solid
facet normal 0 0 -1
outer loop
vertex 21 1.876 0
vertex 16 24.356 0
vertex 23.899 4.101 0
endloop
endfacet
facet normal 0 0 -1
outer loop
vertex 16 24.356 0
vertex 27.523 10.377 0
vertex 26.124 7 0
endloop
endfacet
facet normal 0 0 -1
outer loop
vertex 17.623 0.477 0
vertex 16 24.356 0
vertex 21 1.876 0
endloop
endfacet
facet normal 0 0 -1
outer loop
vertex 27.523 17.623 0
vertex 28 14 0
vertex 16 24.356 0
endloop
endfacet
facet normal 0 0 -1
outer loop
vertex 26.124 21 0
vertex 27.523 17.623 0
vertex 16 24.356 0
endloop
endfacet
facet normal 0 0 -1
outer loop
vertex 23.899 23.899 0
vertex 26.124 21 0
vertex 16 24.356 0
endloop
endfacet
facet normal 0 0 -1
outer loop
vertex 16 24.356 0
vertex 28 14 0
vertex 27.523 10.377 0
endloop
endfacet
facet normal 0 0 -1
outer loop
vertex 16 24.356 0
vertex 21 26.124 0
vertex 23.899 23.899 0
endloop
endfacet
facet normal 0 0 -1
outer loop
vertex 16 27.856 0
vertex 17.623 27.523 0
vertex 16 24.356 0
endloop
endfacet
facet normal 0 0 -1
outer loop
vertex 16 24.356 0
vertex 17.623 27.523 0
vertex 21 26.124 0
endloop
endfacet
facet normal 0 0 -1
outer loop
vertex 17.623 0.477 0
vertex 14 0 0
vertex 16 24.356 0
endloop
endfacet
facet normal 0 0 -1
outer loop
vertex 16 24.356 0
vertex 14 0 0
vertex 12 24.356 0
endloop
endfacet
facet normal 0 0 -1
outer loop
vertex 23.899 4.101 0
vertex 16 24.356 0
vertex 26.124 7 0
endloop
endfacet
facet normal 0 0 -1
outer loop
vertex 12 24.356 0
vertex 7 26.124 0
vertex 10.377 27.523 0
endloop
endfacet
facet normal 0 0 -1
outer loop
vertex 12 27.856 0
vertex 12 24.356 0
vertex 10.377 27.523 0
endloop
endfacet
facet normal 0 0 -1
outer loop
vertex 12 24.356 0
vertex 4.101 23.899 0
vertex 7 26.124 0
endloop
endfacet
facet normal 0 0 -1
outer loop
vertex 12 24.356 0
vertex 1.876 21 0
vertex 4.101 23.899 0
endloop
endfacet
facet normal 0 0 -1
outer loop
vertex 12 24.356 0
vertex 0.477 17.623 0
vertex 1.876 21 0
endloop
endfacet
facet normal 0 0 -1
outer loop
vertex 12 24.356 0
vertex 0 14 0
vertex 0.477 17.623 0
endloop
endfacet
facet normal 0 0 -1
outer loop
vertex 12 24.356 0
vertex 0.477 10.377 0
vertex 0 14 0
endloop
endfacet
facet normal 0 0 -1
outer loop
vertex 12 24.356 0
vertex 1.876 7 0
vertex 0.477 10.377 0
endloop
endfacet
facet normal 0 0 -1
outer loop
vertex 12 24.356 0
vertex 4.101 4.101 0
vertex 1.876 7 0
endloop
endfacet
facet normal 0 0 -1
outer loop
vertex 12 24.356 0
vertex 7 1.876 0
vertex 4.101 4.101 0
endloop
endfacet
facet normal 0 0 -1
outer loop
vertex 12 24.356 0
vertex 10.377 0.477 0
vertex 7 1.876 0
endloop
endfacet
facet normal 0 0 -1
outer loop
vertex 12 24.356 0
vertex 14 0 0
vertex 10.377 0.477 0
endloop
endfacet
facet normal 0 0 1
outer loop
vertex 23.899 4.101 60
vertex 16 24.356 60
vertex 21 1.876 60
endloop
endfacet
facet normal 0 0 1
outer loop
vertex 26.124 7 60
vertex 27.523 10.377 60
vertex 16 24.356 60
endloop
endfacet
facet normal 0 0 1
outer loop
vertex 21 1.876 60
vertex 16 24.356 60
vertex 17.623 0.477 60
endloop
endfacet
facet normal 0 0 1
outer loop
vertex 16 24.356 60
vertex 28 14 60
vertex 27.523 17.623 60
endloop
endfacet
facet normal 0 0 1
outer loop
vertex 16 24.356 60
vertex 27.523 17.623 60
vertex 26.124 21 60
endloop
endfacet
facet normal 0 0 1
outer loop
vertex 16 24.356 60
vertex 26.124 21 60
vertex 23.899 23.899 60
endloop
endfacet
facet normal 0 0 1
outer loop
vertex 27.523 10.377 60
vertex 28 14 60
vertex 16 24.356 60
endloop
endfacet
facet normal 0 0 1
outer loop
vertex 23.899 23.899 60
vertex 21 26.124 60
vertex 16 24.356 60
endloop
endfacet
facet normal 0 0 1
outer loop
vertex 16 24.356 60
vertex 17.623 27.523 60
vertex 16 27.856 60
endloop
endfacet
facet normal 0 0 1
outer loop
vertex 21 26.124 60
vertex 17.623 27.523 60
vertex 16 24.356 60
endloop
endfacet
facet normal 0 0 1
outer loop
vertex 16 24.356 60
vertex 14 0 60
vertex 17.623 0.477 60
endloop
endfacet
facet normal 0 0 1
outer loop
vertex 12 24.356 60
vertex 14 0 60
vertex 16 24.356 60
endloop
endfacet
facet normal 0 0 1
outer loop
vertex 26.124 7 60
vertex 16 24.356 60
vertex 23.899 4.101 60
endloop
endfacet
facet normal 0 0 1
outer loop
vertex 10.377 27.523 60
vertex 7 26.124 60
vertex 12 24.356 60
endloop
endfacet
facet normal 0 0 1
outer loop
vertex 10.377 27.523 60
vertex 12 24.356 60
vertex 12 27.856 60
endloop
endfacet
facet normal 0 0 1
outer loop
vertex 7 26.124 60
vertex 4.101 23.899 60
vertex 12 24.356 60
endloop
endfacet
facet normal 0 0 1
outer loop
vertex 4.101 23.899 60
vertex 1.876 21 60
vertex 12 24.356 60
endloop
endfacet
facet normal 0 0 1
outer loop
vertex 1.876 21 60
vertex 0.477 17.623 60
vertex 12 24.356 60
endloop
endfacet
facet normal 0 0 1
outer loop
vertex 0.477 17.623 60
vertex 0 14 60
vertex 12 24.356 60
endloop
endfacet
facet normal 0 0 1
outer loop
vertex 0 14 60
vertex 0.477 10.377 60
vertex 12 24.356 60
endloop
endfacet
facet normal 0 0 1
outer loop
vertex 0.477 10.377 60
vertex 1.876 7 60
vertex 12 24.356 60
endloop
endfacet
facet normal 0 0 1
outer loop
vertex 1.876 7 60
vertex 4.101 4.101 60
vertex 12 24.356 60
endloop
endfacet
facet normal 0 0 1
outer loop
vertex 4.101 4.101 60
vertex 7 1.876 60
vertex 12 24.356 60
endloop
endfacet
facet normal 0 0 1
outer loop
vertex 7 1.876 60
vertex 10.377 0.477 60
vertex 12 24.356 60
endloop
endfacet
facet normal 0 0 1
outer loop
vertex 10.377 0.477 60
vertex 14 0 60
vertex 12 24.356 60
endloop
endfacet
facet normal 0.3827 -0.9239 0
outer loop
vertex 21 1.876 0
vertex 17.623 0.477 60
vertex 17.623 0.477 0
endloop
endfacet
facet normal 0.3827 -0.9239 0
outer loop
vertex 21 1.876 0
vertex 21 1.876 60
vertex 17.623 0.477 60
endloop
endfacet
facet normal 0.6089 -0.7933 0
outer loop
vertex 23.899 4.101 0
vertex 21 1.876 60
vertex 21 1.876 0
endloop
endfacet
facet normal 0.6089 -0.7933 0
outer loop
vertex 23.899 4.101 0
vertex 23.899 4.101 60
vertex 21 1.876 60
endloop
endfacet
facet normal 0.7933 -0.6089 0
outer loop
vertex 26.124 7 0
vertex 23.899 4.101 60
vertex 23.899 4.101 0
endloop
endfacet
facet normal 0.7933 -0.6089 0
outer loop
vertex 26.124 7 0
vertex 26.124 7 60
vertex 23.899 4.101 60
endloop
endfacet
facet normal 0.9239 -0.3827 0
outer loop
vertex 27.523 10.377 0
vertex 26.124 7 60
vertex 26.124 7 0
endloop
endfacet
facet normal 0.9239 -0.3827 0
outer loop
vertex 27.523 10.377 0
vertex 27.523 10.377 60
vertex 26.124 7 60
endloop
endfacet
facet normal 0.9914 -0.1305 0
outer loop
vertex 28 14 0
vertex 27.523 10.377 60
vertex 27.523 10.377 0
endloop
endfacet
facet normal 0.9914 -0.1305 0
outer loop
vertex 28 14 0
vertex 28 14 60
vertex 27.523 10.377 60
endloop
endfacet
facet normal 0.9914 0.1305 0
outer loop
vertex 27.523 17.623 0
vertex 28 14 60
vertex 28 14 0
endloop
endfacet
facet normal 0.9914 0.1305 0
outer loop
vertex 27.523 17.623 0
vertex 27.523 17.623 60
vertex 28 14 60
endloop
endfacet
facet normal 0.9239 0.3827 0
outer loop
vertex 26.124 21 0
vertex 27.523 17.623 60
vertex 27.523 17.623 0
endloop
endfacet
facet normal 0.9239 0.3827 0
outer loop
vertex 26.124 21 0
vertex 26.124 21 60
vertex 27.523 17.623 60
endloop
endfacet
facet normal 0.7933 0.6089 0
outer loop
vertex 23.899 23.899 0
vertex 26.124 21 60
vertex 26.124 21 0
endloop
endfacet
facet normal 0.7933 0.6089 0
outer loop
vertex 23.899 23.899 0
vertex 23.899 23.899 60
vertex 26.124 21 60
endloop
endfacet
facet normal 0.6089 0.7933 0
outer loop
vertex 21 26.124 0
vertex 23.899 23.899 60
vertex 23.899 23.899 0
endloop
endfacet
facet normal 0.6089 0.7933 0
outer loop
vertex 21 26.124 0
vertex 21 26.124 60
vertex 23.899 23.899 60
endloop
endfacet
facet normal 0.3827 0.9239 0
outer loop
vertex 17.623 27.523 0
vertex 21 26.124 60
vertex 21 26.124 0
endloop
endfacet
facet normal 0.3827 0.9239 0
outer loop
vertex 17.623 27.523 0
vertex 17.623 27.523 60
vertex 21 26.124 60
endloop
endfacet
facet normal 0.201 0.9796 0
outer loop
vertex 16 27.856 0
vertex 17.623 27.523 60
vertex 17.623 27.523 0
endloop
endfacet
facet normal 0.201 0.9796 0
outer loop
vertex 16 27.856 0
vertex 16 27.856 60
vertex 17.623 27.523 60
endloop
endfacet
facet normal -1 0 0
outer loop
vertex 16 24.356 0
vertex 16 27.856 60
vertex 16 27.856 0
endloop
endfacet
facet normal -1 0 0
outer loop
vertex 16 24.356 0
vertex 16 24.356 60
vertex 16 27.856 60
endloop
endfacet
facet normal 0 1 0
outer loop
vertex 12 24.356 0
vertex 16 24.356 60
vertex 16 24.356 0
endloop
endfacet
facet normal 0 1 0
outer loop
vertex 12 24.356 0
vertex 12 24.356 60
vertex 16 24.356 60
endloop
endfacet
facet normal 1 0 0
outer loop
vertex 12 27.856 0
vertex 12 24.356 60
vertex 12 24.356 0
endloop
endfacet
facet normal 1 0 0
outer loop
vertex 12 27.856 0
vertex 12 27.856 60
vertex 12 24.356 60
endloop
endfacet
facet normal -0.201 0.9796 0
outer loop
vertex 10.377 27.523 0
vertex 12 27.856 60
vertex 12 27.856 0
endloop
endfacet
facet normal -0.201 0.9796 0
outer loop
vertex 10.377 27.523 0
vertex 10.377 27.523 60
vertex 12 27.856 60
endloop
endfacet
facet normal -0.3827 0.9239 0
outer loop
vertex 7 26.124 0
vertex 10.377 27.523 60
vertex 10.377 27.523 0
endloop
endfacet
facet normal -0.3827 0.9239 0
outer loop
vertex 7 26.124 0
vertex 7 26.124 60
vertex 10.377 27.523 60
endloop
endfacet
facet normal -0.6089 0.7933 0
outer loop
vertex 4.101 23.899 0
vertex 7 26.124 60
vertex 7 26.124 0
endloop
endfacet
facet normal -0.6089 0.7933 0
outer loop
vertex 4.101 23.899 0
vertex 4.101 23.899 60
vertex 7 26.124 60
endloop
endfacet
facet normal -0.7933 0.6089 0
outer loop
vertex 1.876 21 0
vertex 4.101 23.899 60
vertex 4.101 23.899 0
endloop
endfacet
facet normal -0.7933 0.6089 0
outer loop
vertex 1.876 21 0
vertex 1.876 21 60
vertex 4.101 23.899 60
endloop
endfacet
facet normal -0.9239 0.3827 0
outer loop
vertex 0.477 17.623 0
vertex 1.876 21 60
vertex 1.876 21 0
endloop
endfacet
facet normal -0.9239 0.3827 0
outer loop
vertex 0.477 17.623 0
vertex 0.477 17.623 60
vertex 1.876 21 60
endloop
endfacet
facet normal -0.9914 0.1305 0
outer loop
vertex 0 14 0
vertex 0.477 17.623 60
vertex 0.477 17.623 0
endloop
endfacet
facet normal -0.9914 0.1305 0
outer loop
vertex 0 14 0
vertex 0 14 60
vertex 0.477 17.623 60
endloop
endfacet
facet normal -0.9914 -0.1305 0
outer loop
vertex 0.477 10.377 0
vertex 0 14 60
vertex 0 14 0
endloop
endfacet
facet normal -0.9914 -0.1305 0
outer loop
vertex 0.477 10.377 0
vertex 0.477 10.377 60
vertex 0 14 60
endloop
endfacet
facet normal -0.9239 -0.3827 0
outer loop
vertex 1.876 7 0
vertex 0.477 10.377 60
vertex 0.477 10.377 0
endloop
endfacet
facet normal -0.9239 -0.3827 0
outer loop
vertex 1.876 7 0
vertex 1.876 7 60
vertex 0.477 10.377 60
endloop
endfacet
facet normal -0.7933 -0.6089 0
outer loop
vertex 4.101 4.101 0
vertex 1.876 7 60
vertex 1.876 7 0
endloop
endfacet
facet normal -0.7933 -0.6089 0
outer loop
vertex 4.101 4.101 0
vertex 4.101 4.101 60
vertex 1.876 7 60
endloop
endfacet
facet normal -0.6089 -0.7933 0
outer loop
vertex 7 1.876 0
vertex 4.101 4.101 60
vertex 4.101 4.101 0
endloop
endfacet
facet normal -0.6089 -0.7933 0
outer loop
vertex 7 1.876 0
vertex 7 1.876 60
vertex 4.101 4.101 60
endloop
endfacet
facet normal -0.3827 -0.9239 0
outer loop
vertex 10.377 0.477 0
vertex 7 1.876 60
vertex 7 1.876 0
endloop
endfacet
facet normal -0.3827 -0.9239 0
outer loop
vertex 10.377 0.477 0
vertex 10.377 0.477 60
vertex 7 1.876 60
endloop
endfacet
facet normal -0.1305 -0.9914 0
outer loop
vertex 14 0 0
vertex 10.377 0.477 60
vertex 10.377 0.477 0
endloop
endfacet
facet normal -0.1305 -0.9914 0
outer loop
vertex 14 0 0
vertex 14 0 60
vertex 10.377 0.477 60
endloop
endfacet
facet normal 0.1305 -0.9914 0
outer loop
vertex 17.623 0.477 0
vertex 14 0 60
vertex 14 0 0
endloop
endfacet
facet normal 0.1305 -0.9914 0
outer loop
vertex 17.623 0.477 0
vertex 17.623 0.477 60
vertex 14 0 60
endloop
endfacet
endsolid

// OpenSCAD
$fn = 32;

// ----------------------------------------------------------------------
// Keyway shaft: d28 shaft, key 4 x 3.5 mm
// ----------------------------------------------------------------------

// --- parameters (mm) ---
shaft_r = 14;             // shaft radius
key_w = 4;                // keyway width
key_d = 3.5;              // keyway depth below the surface line
plate_t = 60;             // shaft length, Z (extrusion height)
fit_tol = 0.05;           // declared fit tolerance (prompt contract)
free_tol = 0.3;           // declared free tolerance (prompt contract)

shaft_d = 2 * shaft_r;  // shaft diameter
circle_step = 15;  // polygon sampling step, degrees

profile = [[10.377, 27.523], [7, 26.124], [4.101, 23.899], [1.876, 21], [0.477, 17.623], [0, 14], [0.477, 10.377], [1.876, 7], [4.101, 4.101], [7, 1.876], [10.377, 0.477], [14, 0], [17.623, 0.477], [21, 1.876], [23.899, 4.101], [26.124, 7], [27.523, 10.377], [28, 14], [27.523, 17.623], [26.124, 21], [23.899, 23.899], [21, 26.124], [17.623, 27.523], [16, 27.856], [16, 24.356], [12, 24.356], [12, 27.856]];  // primary outline, 27 points, counter clockwise

// --- the one profile operation ---
linear_extrude(height = plate_t) polygon(points = profile);
